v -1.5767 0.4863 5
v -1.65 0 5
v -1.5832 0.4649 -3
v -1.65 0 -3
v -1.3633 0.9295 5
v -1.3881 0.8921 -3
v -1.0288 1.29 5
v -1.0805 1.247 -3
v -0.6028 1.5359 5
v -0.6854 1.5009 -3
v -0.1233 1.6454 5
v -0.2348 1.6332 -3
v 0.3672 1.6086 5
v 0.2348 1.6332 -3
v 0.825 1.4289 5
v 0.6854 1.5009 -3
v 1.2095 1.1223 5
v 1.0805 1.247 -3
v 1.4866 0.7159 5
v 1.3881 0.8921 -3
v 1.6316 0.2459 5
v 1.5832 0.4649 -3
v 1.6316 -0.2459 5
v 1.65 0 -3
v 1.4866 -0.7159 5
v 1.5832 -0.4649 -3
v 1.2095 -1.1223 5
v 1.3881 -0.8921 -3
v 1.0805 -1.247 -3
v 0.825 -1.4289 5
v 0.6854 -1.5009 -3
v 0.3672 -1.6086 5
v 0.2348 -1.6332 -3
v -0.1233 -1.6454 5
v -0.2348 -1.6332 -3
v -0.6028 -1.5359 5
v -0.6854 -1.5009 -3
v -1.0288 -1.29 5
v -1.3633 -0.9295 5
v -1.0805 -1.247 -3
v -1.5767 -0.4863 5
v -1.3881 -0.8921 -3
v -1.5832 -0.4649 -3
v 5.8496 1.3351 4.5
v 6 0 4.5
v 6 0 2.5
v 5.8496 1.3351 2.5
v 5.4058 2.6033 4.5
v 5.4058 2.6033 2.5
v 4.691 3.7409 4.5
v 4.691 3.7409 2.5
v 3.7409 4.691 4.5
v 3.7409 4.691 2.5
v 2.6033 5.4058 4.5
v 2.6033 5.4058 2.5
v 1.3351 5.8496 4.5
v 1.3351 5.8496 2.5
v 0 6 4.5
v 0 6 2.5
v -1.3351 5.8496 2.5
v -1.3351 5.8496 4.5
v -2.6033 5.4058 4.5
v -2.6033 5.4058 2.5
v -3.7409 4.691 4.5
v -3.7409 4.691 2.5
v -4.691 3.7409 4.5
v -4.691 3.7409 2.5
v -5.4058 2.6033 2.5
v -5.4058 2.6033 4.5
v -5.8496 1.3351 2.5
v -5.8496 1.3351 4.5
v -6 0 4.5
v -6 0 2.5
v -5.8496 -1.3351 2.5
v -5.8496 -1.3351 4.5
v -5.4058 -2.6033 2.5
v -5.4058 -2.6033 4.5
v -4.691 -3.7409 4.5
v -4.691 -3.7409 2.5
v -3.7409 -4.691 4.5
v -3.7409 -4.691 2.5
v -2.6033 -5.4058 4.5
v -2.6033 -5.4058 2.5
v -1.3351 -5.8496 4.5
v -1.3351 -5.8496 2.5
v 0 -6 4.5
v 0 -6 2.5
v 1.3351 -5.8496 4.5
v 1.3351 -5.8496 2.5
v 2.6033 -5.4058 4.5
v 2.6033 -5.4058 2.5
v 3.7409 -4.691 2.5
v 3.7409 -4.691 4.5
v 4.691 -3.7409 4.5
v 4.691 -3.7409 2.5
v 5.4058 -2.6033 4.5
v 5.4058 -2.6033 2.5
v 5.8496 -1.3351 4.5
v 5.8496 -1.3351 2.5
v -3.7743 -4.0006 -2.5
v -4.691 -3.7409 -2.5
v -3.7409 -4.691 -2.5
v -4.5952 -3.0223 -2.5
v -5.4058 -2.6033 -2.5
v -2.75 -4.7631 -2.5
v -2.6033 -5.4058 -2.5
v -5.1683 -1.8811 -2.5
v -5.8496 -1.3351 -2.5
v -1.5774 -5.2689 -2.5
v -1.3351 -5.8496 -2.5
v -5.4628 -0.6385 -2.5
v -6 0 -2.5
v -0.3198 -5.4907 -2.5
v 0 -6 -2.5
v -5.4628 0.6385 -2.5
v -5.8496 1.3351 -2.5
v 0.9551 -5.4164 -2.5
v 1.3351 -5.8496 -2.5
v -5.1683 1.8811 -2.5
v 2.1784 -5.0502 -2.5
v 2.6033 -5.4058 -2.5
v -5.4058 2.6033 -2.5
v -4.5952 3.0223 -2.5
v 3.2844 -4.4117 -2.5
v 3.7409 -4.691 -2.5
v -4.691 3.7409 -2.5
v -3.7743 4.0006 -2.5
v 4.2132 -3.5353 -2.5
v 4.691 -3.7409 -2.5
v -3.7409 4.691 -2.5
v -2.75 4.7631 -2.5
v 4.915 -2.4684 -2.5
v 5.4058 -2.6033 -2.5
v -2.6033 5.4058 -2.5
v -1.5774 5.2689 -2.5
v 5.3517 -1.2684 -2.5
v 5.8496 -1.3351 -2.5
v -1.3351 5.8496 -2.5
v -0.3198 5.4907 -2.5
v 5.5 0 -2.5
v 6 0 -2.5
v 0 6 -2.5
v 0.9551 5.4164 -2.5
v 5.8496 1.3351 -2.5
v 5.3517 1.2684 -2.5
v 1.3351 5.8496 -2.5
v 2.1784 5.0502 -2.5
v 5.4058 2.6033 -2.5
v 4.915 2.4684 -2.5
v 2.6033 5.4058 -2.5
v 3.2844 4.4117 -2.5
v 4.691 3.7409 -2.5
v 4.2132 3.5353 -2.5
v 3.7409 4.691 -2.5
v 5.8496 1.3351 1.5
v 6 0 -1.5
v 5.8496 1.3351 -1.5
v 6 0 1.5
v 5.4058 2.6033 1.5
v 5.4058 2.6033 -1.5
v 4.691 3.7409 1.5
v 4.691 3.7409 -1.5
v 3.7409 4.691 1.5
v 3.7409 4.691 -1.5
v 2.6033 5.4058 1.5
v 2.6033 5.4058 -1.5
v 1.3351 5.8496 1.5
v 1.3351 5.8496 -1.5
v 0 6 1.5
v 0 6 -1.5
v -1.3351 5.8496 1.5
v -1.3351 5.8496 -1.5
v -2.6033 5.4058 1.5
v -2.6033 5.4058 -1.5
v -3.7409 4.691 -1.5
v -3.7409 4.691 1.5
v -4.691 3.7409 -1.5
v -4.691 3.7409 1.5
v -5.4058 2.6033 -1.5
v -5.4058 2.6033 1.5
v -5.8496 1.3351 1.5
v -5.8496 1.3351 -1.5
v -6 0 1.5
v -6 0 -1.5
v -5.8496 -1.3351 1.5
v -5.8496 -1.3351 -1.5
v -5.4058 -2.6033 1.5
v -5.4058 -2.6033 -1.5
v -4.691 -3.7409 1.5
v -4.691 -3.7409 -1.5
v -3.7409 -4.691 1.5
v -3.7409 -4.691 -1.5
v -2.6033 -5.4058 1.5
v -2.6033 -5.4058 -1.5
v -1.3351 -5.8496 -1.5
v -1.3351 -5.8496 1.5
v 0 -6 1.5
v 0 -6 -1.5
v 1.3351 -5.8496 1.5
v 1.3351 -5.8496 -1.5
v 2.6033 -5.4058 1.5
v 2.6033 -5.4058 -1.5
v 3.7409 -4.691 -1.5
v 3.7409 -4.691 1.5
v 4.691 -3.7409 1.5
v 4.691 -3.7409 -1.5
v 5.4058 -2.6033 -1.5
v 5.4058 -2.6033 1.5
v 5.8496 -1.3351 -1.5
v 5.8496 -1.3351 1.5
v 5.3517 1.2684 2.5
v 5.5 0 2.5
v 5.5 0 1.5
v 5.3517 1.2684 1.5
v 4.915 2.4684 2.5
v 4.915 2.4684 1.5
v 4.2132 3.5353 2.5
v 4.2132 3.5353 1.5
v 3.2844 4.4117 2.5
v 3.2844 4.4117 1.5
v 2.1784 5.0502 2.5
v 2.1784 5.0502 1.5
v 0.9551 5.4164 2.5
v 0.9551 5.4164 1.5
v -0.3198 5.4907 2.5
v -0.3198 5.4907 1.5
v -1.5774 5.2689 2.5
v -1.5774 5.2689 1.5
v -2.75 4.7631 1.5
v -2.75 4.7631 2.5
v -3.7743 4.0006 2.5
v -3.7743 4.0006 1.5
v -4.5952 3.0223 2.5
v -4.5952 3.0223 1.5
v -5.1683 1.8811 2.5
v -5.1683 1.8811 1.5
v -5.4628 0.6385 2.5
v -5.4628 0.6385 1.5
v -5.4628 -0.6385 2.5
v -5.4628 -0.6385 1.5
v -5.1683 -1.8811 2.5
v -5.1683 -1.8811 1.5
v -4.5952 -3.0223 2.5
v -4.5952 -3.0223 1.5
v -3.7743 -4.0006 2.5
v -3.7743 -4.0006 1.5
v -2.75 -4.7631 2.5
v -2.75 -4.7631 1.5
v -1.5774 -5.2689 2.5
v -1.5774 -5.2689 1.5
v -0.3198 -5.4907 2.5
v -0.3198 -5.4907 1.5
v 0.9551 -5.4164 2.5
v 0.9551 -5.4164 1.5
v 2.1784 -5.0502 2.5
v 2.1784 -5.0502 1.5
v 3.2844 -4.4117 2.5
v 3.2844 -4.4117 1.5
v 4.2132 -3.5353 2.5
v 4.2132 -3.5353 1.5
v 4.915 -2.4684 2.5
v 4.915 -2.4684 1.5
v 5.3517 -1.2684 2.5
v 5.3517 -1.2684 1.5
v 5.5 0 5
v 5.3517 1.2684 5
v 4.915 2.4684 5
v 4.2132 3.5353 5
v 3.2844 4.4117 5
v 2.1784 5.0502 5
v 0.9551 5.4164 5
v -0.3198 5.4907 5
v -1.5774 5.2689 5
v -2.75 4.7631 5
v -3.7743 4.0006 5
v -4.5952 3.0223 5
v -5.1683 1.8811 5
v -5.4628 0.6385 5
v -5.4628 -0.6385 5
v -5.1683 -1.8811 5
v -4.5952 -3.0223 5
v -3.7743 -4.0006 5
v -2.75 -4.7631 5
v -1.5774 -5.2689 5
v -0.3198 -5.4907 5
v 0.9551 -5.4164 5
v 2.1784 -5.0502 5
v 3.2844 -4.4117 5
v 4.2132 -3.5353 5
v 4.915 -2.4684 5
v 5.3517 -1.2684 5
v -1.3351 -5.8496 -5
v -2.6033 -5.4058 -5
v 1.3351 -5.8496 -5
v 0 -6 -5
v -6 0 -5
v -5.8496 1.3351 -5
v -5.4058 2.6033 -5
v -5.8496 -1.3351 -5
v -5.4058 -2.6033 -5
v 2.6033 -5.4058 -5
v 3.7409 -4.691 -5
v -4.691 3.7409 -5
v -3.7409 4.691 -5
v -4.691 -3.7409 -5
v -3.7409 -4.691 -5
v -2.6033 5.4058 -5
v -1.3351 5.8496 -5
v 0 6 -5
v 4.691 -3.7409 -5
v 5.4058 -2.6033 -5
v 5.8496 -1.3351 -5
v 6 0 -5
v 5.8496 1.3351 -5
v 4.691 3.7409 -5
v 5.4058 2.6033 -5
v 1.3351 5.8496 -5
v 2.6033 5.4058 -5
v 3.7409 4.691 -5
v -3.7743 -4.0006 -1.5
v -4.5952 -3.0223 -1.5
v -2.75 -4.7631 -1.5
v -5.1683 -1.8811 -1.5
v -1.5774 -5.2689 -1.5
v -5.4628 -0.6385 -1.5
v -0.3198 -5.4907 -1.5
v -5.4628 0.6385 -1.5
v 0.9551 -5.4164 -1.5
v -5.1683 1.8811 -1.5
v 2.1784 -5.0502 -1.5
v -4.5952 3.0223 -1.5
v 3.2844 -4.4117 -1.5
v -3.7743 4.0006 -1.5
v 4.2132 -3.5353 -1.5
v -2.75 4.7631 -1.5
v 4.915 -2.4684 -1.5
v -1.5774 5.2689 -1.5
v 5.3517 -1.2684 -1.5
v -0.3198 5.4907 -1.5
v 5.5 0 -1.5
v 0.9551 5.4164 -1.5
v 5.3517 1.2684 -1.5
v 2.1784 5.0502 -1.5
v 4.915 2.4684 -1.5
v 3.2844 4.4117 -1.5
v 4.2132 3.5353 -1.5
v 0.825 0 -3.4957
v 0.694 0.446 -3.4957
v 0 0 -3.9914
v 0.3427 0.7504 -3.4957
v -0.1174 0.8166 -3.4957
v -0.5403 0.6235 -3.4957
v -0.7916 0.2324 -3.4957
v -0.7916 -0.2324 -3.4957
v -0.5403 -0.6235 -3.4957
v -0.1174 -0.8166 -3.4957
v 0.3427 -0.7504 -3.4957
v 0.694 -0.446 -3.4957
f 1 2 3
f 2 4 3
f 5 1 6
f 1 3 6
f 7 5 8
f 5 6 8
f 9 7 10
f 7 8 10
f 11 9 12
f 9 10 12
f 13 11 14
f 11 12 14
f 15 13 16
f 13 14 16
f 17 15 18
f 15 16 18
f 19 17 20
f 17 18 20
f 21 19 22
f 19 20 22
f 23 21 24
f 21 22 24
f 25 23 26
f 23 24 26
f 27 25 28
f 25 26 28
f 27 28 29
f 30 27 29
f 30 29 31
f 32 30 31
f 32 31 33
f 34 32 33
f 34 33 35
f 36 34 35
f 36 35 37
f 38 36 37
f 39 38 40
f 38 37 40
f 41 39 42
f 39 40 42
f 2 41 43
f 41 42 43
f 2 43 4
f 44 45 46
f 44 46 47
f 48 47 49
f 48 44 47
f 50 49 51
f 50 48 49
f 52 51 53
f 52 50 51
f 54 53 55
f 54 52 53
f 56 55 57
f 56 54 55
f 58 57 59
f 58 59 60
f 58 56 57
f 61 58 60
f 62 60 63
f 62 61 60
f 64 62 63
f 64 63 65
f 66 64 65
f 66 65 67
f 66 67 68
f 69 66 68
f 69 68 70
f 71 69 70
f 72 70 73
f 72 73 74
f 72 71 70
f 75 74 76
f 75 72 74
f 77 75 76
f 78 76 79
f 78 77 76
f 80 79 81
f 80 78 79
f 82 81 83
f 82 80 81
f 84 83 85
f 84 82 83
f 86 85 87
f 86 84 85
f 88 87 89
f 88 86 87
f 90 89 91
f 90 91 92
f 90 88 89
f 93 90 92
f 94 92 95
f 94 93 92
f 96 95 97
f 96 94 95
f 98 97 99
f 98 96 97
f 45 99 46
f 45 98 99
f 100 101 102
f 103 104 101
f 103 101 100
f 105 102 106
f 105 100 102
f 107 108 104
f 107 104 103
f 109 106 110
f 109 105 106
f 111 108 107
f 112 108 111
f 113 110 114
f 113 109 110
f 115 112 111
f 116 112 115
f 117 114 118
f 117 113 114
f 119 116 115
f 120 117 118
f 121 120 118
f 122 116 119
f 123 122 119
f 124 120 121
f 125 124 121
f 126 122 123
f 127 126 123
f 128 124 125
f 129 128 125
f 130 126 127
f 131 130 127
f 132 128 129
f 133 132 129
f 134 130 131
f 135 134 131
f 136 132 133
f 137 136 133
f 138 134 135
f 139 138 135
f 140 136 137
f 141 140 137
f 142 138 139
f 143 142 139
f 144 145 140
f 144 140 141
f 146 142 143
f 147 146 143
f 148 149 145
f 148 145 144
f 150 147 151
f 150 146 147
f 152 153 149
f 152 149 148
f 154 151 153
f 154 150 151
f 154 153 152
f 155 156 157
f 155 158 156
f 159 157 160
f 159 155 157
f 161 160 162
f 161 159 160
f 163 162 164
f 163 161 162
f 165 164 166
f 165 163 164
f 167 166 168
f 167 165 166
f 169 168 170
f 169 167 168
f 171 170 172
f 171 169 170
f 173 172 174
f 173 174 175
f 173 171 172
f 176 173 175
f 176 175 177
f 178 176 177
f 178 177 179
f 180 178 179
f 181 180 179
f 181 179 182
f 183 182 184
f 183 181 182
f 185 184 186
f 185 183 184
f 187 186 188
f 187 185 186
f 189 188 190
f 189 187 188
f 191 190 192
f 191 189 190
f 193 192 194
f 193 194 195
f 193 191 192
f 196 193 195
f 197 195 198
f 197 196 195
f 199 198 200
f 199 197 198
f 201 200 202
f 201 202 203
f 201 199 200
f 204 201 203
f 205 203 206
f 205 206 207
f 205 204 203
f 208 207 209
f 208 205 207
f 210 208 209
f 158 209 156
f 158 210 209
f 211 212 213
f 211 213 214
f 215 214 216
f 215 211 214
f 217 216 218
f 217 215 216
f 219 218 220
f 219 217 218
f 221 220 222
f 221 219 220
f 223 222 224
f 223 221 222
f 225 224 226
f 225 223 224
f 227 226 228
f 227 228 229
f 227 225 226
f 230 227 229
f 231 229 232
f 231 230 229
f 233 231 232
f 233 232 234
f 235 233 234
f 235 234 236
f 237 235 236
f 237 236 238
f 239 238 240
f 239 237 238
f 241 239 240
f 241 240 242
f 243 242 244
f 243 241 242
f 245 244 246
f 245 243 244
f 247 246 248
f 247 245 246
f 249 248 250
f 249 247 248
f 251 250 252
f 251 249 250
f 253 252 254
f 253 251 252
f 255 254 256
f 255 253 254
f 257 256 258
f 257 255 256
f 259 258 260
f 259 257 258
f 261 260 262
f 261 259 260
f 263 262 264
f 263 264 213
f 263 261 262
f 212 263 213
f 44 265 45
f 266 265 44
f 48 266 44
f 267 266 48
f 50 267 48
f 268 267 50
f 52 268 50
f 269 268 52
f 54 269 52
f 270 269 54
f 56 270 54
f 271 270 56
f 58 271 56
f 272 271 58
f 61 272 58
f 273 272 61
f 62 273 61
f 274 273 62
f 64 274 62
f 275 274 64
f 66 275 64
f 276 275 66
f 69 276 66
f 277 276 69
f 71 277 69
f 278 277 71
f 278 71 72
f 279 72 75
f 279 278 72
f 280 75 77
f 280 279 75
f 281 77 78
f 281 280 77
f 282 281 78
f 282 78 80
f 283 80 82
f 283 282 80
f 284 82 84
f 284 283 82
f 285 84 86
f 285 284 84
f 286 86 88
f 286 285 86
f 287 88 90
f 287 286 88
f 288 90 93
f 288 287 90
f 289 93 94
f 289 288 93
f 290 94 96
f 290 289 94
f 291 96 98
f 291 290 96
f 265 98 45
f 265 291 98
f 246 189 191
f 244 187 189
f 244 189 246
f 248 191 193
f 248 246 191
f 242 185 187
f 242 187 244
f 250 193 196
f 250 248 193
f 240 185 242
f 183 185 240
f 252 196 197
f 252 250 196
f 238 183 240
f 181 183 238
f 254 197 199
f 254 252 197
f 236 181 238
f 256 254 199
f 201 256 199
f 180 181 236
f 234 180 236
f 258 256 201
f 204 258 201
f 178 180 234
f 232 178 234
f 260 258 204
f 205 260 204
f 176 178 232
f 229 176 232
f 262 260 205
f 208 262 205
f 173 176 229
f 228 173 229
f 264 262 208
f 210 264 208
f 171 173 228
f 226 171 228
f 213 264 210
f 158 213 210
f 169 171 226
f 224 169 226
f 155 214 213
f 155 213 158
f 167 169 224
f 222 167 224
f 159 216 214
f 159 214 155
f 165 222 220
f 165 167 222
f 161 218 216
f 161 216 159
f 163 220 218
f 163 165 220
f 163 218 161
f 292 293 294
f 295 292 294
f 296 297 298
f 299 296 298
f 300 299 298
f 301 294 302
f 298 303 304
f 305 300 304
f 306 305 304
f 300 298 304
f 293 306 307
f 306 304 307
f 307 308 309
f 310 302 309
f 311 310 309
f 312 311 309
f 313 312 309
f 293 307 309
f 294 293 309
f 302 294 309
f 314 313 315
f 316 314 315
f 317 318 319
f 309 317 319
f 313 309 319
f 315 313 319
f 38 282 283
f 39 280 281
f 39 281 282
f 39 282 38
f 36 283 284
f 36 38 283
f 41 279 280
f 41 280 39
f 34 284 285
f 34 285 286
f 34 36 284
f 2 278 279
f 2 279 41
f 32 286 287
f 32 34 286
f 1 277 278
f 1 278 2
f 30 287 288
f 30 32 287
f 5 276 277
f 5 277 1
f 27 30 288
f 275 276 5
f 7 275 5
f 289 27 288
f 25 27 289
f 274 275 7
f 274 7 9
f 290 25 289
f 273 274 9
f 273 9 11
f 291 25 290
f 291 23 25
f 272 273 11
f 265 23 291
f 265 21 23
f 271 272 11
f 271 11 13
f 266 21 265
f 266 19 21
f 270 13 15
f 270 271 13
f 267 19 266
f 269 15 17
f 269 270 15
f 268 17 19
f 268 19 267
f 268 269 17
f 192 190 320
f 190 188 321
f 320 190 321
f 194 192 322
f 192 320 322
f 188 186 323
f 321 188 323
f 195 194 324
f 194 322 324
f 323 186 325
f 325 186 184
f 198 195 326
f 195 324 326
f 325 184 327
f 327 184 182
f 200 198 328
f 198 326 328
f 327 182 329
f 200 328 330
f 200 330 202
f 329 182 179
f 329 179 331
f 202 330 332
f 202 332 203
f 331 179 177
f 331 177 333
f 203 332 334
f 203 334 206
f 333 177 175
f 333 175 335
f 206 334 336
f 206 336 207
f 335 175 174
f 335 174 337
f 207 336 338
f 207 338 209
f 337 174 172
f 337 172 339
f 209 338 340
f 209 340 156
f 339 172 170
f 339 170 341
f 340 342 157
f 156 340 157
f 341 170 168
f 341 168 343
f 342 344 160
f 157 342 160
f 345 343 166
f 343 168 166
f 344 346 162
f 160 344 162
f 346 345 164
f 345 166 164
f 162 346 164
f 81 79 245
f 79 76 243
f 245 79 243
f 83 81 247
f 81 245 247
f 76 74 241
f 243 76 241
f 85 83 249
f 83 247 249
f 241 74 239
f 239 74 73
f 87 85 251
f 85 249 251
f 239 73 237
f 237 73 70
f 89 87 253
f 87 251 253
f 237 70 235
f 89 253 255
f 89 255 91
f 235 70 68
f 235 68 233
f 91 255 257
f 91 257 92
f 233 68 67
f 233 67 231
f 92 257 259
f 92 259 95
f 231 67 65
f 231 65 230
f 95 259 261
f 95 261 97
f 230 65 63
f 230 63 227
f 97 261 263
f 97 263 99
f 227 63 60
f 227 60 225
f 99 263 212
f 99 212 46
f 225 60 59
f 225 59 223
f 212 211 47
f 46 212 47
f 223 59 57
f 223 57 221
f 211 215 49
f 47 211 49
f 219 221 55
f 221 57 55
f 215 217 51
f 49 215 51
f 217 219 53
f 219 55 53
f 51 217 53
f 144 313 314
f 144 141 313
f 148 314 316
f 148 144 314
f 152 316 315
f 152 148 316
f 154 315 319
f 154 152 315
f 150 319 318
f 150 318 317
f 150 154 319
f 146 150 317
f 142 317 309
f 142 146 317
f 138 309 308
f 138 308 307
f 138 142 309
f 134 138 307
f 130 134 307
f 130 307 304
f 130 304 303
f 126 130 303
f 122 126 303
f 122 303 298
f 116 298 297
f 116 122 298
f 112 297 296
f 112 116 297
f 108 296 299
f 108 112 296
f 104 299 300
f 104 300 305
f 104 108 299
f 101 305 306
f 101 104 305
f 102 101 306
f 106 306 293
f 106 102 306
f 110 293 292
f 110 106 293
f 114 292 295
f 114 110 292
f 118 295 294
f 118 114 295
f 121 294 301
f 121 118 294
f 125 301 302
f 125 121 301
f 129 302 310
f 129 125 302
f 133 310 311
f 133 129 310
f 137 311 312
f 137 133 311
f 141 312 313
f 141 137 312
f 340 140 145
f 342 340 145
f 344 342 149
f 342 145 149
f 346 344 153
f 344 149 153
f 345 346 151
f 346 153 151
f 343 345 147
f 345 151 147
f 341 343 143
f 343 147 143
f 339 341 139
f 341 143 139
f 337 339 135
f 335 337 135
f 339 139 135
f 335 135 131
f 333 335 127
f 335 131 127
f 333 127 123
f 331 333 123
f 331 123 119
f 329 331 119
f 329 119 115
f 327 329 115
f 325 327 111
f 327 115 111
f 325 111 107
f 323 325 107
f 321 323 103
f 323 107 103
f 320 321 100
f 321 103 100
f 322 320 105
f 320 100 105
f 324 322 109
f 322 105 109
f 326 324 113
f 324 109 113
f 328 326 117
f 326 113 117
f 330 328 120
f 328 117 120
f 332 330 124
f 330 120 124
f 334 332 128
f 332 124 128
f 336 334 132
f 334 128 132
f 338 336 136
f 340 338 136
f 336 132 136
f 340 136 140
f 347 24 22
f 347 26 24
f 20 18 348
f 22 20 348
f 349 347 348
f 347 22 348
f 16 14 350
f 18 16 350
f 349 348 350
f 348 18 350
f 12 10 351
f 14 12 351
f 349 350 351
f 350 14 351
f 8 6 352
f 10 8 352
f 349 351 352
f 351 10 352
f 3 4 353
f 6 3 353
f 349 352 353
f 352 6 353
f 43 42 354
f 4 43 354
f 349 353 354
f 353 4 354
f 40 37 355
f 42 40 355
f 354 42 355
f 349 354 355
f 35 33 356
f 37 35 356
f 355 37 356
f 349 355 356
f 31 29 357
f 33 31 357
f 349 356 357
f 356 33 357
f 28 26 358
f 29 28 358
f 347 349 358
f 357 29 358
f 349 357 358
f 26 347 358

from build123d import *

# Parameters (mm, degrees)
SKETCH1_R                 = 6
BOSS_EXTRUDE1_DEPTH       = 5
CUT_EXTRUDE1_START        = -2.5
SKETCH2_R                 = 6
SKETCH2_R_2               = 5.5
CUT_EXTRUDE1_DEPTH        = 1
CHAMFER1_SIZE             = 0.5
M4X0_7_TAPPED_HOLE1_D     = 3.3
M4X0_7_TAPPED_HOLE1_DEPTH = 8
M4X0_7_TAPPED_HOLE1_TIP   = 0.991420021


with BuildPart() as part:
    # Sketch1 → Boss-Extrude1 (new body, symmetric)
    with BuildSketch(Plane.XY):
        Circle(SKETCH1_R)
    extrude(amount=BOSS_EXTRUDE1_DEPTH, both=True)

    # Sketch2 → Cut-Extrude1 (cut)
    with BuildSketch(Plane.XY.offset(5).offset(CUT_EXTRUDE1_START)):
        Circle(SKETCH2_R)
        Circle(SKETCH2_R_2, mode=Mode.SUBTRACT)
    cut_extrude1 = extrude(amount=-CUT_EXTRUDE1_DEPTH, mode=Mode.SUBTRACT)

    # Mirror1: Cut-Extrude1 across plane
    add(cut_extrude1.mirror(Plane.XY), mode=Mode.SUBTRACT)

    # Chamfer1
    chamfer1_edges = [part.edges().sort_by_distance(p)[0] for p in [
        (-6, 0, 5),
    ]]
    chamfer(chamfer1_edges, length=CHAMFER1_SIZE)

    # M4x0.7 Tapped Hole1
    with Locations(Plane.XY.offset(5)):
        with Locations((0, 0)):
            Hole(M4X0_7_TAPPED_HOLE1_D / 2, depth=M4X0_7_TAPPED_HOLE1_DEPTH)
            with Locations((0, 0, -(M4X0_7_TAPPED_HOLE1_DEPTH + M4X0_7_TAPPED_HOLE1_TIP / 2))):  # 118° drill point
                Cone(0, M4X0_7_TAPPED_HOLE1_D / 2, M4X0_7_TAPPED_HOLE1_TIP, mode=Mode.SUBTRACT)


solid = part.part
